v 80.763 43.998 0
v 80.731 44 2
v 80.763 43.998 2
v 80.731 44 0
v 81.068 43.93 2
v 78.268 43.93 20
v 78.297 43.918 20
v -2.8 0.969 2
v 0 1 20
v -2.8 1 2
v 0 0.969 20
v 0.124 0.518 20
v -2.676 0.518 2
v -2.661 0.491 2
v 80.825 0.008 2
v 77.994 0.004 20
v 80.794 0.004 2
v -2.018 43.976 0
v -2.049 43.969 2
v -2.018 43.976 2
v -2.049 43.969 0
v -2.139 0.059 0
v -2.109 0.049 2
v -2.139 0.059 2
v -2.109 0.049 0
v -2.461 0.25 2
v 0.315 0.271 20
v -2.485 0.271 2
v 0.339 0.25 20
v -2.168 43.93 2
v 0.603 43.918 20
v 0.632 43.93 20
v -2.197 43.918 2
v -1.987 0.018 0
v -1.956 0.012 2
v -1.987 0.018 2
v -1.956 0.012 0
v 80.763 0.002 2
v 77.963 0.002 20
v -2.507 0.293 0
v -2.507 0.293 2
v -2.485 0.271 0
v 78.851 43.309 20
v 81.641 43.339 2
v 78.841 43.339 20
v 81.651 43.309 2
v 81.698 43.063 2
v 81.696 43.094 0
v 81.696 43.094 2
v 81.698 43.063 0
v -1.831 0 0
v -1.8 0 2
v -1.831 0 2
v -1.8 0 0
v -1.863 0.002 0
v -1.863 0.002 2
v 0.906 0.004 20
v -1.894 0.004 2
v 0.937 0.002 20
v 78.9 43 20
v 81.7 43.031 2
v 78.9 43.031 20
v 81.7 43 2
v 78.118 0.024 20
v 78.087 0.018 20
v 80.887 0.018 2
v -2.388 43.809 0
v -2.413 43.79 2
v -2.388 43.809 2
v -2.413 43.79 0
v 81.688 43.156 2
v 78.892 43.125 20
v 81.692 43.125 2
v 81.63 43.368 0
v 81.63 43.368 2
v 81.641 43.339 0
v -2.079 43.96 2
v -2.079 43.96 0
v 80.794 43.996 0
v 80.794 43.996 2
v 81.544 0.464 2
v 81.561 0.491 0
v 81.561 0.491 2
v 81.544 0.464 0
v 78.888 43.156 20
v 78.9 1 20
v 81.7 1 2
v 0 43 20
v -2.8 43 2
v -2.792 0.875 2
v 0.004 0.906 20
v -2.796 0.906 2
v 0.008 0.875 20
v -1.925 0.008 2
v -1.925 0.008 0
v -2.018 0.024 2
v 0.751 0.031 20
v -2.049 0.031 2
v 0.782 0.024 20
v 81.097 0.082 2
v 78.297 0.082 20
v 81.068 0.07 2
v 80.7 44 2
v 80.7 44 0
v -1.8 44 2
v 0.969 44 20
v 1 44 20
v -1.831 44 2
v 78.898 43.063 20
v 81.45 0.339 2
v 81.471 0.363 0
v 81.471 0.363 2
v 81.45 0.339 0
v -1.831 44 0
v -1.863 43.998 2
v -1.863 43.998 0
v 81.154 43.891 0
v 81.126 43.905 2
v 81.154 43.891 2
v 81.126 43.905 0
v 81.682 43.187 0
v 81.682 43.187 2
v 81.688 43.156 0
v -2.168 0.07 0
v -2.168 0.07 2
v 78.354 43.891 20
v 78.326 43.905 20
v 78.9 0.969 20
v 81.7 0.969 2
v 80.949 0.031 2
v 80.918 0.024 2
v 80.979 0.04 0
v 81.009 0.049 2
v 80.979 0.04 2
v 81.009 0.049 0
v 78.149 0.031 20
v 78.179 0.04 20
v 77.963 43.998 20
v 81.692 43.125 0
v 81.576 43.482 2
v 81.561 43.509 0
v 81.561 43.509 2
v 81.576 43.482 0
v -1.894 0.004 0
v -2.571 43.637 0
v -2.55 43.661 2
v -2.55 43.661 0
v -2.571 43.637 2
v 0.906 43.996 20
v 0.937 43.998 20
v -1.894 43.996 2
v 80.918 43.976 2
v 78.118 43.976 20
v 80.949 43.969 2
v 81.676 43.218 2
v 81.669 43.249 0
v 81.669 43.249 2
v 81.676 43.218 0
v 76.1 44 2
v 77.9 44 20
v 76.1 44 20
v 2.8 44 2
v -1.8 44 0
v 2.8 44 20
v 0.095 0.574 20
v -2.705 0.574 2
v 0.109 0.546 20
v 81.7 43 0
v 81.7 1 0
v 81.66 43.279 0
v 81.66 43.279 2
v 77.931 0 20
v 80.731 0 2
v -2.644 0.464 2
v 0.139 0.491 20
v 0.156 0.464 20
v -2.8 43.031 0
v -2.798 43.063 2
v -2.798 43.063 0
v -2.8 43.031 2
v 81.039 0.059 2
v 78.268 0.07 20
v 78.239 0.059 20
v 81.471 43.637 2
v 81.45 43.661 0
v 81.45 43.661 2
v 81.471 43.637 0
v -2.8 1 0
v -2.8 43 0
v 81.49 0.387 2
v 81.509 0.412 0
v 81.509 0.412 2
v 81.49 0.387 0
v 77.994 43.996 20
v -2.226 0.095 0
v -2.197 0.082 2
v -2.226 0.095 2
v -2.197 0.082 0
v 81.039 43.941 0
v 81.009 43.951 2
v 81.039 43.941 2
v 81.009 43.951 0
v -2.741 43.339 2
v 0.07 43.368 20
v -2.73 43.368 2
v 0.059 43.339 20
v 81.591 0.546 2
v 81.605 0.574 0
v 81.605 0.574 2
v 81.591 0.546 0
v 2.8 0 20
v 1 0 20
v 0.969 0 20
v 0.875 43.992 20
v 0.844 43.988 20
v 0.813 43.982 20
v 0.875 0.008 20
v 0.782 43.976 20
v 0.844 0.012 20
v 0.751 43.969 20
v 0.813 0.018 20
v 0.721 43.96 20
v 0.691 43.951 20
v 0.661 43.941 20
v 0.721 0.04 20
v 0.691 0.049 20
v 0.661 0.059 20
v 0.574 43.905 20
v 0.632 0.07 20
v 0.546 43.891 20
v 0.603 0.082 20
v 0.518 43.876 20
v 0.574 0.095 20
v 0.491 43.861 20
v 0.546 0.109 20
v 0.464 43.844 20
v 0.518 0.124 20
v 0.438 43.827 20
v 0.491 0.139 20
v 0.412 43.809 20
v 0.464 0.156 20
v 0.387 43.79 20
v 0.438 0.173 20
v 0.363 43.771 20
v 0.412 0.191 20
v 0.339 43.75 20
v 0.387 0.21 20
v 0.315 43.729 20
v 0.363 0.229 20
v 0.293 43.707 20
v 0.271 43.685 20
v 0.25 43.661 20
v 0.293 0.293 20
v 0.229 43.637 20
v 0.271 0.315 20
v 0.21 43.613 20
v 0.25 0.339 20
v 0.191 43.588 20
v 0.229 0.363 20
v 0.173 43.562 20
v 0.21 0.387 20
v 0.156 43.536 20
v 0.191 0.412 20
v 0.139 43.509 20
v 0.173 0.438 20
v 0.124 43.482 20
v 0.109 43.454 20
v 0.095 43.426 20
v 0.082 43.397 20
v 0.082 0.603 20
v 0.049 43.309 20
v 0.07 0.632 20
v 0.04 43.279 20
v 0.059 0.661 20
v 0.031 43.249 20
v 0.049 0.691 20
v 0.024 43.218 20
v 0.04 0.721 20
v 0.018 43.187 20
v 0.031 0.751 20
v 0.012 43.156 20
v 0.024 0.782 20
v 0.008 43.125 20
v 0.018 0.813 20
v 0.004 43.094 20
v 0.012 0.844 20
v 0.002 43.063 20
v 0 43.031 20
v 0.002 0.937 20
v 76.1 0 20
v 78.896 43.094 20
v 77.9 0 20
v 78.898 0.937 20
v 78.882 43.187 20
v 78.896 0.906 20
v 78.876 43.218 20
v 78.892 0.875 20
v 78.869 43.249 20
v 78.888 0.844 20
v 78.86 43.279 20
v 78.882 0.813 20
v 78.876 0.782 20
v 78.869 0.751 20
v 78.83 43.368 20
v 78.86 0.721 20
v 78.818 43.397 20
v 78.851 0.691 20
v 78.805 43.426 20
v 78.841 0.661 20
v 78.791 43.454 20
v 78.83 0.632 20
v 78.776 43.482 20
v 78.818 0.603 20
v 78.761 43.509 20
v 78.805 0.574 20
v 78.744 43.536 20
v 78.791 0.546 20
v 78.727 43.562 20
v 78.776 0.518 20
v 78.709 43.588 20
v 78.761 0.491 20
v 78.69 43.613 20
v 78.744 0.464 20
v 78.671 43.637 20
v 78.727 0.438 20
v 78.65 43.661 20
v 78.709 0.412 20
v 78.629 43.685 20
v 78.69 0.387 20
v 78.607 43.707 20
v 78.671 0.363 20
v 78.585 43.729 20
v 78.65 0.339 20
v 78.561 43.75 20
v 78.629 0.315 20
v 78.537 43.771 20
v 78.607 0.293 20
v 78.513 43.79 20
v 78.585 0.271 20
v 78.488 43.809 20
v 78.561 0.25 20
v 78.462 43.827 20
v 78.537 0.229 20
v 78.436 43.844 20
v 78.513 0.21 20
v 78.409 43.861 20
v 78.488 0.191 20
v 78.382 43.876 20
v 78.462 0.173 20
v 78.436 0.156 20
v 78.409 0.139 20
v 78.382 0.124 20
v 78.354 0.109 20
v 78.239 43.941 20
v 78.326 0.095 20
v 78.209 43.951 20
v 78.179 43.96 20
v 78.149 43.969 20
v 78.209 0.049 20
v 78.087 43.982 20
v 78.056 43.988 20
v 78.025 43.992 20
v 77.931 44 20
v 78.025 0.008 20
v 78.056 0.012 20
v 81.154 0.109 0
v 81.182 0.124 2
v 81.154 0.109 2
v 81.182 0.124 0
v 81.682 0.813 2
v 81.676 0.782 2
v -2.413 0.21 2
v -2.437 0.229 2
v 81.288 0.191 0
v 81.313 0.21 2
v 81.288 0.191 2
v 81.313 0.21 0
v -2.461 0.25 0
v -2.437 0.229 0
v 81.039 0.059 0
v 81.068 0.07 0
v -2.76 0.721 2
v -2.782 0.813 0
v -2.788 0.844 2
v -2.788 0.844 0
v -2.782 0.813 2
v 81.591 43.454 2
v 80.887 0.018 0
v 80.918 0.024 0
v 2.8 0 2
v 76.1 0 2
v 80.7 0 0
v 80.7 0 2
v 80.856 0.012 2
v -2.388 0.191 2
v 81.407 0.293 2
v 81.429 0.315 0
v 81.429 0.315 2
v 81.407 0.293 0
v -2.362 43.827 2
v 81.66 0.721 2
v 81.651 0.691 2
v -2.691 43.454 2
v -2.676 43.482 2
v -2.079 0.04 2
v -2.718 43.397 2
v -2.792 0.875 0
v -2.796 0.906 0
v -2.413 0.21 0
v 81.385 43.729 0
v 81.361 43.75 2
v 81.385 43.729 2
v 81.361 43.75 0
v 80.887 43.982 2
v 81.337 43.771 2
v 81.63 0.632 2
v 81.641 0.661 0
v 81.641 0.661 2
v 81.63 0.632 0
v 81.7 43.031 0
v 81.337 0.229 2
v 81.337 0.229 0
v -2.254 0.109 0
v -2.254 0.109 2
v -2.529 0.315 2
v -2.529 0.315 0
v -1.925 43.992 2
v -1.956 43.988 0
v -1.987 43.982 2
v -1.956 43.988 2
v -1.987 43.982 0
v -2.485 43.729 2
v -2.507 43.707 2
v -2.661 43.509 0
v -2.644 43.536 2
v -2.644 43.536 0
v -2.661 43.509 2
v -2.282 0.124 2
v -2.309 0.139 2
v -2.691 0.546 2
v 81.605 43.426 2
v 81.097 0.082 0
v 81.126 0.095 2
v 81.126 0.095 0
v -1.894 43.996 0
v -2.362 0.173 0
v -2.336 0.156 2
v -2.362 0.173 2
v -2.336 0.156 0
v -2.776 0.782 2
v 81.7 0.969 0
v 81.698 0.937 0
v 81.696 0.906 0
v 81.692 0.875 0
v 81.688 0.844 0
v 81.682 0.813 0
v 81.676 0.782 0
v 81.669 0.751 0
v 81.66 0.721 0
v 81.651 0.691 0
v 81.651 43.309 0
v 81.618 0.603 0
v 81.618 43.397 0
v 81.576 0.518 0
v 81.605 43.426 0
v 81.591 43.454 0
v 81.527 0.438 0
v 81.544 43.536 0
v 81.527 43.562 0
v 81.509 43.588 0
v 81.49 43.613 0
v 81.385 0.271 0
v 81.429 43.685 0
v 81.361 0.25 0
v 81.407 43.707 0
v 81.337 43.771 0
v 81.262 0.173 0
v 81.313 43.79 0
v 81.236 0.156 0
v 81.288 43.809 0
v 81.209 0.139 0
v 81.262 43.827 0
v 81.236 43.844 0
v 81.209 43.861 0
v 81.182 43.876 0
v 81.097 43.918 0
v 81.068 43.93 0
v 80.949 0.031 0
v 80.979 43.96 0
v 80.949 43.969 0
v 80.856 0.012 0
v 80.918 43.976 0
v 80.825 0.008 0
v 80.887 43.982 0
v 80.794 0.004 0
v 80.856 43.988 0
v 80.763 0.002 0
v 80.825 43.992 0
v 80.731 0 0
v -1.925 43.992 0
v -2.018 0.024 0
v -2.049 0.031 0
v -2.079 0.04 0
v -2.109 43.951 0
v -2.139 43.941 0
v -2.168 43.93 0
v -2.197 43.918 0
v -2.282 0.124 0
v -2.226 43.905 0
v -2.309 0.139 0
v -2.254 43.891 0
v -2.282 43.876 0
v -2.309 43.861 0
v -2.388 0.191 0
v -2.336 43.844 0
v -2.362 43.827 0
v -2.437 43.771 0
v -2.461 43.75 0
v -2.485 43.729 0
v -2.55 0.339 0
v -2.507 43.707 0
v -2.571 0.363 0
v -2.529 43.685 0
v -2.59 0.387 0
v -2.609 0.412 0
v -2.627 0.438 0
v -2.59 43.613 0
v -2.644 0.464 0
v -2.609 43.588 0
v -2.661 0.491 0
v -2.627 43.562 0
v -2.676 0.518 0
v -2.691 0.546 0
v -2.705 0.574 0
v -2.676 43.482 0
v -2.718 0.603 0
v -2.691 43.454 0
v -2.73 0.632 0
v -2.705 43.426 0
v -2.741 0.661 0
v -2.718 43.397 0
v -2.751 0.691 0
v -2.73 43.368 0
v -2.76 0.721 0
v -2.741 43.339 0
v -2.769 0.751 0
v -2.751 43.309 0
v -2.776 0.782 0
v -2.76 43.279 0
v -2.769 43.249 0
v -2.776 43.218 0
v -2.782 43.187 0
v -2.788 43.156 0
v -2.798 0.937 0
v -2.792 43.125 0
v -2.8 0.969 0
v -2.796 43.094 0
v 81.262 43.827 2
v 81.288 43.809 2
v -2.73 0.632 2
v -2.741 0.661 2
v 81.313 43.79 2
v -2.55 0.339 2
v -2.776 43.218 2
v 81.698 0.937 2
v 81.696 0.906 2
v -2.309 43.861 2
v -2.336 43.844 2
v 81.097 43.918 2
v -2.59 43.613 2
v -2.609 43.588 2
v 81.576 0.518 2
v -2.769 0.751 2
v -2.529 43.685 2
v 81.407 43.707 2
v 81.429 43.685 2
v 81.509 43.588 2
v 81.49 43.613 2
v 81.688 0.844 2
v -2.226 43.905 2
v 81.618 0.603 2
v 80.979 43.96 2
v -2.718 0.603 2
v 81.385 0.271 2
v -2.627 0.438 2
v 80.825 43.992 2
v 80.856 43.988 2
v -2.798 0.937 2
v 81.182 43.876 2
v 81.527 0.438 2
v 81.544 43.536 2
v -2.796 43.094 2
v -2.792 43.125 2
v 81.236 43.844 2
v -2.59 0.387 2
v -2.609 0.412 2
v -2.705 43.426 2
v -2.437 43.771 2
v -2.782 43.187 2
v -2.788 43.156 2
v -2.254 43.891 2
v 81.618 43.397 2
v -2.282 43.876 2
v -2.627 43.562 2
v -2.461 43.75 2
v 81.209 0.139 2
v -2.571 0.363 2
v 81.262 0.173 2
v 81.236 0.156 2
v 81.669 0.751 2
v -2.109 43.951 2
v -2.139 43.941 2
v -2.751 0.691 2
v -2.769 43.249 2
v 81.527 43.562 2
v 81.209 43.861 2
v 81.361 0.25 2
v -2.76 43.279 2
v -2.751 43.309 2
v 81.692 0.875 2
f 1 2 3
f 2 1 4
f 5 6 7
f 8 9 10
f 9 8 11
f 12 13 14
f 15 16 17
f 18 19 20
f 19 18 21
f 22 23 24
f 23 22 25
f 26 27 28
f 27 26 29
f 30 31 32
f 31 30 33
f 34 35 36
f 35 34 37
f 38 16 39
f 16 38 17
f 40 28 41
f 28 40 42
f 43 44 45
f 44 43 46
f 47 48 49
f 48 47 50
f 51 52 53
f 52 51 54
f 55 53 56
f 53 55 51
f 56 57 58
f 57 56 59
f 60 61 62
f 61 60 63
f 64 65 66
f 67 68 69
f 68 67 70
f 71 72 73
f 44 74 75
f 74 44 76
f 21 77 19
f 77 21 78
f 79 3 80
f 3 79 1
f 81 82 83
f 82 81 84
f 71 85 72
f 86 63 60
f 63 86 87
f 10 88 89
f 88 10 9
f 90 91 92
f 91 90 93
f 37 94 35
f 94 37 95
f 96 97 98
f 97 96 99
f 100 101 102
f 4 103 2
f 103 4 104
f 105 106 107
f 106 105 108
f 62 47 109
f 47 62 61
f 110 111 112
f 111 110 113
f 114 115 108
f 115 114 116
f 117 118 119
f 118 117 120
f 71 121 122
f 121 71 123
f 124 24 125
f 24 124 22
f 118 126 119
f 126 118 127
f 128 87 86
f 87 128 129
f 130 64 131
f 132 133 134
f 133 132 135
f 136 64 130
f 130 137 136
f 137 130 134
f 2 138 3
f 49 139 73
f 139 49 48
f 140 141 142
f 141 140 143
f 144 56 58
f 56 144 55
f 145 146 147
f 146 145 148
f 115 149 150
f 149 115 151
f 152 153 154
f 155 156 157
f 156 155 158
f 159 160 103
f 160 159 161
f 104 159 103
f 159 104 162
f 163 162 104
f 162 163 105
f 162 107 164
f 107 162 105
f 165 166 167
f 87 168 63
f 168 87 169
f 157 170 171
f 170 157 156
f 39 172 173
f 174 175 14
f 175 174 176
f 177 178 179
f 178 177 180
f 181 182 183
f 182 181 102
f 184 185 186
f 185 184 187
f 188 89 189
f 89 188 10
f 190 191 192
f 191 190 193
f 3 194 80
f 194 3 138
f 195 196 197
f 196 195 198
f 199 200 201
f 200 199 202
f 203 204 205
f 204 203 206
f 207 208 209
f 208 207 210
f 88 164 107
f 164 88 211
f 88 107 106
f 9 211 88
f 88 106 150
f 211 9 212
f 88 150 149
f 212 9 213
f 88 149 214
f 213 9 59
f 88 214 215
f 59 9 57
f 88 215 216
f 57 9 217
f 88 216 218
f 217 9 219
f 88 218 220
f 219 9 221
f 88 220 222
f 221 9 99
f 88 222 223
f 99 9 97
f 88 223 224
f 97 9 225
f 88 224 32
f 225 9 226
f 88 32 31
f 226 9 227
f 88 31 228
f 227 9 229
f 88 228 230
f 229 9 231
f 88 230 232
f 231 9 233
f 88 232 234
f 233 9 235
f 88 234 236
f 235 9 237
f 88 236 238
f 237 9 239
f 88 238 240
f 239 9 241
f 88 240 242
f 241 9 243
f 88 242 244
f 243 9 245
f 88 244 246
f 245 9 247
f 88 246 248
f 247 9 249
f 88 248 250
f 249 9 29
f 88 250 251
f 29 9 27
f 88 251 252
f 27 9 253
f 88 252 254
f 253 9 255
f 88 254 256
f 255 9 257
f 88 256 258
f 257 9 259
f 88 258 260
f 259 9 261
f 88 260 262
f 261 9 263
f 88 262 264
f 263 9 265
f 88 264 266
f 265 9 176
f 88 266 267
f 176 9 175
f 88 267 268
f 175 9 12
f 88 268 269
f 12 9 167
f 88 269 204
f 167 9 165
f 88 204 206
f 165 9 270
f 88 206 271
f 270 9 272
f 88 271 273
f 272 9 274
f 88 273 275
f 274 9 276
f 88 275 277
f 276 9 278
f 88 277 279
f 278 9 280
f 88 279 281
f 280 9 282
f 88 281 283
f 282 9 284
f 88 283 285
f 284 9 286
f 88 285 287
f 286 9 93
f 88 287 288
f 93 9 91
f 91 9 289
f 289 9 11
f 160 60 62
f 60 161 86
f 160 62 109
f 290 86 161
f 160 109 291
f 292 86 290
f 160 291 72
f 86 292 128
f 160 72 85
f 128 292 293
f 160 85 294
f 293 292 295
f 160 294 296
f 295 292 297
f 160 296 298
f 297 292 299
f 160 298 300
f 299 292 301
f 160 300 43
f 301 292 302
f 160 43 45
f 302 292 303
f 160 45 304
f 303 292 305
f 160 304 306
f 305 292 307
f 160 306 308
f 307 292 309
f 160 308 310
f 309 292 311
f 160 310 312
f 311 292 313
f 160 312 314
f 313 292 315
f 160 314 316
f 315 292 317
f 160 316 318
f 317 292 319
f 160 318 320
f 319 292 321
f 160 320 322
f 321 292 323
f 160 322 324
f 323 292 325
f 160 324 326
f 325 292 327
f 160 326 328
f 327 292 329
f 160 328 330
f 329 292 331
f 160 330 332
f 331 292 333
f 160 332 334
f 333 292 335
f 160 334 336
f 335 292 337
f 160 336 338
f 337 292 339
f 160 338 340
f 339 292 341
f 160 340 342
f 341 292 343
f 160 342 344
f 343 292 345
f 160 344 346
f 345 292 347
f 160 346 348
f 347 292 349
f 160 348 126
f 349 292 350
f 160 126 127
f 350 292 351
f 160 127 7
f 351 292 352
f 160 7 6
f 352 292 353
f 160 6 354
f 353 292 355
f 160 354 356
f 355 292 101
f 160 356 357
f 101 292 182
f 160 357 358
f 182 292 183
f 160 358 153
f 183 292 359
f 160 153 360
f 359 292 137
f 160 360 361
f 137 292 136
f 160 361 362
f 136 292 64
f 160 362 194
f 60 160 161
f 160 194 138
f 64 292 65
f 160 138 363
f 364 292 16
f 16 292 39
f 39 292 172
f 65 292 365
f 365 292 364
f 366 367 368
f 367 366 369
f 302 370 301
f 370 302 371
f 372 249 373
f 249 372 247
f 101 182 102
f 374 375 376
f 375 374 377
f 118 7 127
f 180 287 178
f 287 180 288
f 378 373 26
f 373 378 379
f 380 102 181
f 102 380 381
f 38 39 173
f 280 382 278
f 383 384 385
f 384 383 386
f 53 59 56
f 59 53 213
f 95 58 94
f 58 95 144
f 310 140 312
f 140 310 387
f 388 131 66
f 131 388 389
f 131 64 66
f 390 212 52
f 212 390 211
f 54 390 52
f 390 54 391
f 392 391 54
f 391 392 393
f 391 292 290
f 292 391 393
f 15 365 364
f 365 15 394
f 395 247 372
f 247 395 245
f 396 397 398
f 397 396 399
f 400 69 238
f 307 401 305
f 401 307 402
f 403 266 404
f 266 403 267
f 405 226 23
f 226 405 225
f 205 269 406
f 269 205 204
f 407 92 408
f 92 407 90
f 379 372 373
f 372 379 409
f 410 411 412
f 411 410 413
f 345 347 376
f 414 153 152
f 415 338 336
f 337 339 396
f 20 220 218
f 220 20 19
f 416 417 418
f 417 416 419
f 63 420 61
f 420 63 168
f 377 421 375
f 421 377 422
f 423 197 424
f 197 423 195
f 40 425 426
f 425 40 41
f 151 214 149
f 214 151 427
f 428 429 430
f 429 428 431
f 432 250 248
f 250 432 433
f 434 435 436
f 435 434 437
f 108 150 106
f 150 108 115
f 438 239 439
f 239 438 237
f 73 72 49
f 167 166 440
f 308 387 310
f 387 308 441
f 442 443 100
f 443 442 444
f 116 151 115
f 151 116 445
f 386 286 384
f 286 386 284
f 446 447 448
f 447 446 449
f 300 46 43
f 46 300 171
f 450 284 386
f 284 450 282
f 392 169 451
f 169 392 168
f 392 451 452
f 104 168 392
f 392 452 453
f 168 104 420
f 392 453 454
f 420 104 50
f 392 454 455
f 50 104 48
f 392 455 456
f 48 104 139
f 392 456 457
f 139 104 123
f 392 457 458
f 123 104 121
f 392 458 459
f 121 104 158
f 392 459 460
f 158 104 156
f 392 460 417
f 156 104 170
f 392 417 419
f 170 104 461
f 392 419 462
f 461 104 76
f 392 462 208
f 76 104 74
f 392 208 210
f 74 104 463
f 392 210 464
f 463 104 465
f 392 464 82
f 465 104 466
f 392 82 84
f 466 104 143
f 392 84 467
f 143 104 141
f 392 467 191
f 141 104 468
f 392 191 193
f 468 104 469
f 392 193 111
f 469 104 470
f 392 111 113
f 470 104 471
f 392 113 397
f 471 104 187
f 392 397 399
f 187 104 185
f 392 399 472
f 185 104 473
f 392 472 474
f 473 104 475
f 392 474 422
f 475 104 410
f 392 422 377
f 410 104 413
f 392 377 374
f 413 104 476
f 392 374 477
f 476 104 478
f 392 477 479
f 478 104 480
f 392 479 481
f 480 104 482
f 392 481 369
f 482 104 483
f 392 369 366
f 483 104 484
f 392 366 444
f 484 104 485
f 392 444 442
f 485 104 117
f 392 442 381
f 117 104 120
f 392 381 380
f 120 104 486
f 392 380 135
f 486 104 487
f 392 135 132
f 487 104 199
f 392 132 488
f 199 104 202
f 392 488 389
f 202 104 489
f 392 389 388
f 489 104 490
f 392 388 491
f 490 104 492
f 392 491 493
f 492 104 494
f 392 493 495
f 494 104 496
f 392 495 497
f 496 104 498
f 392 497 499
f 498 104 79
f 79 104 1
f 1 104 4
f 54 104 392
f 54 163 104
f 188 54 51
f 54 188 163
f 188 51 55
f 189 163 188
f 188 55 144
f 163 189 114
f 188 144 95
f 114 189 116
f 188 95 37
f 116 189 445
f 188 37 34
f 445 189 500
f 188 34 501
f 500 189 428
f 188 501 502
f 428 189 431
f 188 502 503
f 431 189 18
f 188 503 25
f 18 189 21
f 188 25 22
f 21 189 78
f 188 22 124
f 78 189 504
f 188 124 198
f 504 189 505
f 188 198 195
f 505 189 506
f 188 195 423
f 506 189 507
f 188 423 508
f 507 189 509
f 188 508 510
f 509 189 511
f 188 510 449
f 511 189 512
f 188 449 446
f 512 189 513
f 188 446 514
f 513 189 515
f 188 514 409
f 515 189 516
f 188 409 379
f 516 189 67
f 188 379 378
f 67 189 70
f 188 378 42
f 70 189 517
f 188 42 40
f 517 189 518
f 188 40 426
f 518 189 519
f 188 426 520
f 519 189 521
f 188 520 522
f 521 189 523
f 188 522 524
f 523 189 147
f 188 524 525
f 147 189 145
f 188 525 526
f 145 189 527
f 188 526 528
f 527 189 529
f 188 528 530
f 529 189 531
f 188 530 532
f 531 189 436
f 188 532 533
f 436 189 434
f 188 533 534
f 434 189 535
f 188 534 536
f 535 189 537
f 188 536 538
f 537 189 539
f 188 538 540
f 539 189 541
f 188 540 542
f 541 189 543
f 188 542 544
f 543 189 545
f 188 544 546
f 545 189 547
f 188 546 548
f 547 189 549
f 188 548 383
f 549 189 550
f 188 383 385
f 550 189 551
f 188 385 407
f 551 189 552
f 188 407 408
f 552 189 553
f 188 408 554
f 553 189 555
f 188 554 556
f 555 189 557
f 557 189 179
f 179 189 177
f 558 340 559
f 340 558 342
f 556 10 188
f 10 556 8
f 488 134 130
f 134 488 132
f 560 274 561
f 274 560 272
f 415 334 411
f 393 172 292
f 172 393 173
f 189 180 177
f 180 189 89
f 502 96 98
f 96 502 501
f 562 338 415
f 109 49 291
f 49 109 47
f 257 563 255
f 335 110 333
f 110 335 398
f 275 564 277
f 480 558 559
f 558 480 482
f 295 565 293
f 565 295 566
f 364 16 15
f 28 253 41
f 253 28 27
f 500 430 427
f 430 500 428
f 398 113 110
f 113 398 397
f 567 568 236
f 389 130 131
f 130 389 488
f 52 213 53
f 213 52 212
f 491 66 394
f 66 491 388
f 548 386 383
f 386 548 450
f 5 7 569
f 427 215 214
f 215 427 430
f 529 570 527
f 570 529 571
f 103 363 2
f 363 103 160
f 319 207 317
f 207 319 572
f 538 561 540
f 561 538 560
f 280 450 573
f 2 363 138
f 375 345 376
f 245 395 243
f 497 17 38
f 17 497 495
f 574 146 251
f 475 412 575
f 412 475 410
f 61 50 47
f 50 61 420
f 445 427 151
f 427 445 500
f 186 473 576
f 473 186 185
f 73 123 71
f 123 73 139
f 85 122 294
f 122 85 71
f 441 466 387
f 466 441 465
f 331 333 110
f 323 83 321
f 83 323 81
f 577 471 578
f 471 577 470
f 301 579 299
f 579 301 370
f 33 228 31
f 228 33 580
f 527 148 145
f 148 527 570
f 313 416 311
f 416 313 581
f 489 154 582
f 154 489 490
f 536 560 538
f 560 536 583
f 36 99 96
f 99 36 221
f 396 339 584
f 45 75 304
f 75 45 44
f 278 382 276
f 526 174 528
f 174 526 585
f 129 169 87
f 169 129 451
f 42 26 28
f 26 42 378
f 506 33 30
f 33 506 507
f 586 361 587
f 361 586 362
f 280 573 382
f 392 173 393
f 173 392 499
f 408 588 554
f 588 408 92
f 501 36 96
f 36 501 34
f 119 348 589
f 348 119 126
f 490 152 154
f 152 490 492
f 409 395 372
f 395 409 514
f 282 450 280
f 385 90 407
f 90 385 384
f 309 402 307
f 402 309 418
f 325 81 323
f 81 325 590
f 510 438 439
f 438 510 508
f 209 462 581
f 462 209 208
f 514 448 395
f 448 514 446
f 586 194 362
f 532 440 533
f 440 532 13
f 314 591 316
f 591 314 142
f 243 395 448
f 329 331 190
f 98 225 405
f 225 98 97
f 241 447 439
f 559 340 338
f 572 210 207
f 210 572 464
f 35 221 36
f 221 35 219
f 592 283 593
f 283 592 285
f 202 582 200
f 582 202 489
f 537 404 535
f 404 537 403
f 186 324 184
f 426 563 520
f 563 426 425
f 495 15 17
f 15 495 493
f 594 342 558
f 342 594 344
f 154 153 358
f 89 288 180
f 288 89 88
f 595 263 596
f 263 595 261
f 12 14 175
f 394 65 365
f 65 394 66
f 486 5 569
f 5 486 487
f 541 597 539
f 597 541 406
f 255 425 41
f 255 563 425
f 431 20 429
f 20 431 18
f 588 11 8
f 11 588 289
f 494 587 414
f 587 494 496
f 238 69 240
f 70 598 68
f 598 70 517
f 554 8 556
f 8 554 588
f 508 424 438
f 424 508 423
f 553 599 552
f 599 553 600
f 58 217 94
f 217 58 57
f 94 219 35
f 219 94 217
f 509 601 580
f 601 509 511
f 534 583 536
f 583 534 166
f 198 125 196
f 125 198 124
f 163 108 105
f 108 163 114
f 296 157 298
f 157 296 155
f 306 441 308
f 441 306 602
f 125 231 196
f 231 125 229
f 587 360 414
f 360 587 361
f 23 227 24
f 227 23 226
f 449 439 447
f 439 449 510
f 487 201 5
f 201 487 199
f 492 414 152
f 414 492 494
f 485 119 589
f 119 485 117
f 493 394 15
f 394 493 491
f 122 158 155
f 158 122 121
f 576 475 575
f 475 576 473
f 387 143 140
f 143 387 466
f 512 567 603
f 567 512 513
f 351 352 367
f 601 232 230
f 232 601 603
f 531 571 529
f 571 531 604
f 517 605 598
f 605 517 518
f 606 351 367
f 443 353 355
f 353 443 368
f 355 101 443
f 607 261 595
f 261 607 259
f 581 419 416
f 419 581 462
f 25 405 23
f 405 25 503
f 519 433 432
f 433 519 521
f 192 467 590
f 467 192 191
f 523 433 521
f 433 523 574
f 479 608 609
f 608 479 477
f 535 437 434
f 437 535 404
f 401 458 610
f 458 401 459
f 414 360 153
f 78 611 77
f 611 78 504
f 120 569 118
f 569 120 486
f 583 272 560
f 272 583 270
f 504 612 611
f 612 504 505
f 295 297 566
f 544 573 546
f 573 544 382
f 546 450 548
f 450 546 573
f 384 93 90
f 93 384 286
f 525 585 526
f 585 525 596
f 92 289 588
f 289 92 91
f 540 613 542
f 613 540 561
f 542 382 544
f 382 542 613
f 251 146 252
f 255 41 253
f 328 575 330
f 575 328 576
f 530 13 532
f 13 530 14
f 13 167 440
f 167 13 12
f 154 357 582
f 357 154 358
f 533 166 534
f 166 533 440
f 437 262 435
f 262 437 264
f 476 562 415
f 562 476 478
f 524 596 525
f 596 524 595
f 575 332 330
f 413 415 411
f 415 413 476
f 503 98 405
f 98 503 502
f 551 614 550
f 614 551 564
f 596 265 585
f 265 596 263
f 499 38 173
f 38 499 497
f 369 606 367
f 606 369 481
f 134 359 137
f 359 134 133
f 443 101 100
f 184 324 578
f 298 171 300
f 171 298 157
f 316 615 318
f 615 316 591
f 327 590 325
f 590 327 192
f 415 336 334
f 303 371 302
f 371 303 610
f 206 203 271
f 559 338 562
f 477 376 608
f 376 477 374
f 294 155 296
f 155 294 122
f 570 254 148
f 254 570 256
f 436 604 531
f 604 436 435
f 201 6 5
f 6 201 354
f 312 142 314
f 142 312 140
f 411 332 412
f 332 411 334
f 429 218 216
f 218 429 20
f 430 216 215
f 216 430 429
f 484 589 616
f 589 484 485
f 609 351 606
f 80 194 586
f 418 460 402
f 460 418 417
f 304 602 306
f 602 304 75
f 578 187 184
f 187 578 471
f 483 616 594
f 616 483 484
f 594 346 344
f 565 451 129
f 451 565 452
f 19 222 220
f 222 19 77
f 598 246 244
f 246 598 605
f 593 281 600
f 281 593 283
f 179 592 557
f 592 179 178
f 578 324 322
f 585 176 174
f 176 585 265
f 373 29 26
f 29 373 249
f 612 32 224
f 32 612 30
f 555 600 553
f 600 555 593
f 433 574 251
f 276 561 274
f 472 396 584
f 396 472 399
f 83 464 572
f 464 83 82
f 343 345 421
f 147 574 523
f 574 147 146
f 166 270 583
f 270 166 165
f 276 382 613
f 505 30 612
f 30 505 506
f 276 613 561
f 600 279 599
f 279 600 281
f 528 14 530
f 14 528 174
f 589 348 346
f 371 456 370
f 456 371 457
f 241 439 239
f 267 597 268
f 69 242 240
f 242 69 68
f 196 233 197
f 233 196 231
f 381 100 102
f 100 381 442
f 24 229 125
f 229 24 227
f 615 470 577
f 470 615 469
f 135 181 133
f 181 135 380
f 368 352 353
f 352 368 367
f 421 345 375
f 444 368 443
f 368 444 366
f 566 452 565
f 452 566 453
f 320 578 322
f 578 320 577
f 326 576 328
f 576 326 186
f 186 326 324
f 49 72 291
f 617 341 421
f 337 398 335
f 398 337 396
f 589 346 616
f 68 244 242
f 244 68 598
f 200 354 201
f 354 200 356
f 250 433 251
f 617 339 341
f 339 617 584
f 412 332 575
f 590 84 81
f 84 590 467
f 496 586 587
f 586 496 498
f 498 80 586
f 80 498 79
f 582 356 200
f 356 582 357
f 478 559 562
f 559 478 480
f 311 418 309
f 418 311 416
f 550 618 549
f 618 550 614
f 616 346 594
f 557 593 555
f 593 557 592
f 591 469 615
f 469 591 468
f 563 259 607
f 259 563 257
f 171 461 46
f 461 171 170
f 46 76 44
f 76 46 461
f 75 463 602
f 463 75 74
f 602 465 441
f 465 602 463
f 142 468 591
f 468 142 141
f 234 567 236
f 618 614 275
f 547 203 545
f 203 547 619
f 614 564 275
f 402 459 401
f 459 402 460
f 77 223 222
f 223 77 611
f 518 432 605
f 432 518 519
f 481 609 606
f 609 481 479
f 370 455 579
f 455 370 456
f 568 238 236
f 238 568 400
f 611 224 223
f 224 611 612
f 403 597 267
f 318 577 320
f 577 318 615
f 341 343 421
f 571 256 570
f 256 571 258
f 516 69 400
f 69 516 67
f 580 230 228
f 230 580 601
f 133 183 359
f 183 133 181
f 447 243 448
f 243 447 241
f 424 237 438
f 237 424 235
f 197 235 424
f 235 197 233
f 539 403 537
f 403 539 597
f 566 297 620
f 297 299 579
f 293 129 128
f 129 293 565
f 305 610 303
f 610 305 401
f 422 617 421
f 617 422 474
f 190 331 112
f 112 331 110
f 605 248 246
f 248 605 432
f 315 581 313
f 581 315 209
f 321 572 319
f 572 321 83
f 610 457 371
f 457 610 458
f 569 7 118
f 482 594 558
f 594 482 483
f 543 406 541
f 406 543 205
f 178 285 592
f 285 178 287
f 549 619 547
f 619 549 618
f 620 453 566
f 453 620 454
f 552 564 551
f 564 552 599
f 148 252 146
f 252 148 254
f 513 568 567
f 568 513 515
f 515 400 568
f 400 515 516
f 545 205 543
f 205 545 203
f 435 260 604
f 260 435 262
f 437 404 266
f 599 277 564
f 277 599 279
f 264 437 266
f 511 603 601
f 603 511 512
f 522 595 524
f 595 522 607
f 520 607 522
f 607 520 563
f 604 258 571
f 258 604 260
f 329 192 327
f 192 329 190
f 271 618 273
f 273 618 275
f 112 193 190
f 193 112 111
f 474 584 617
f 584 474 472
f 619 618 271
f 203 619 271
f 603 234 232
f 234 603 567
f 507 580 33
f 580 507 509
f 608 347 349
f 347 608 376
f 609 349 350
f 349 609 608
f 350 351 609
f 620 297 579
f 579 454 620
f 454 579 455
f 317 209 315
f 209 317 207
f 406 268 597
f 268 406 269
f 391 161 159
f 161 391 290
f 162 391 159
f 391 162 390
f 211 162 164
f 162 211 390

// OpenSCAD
$fn=200;

w=2.8;
x=73.3;
y=44;

difference() {
    hull() {
        cube_rounded(v=[x+2*w,y,20], r=1);
        translate(v = [-w,0,0]) cube_rounded(v=[x+4*w,y,2], r=1);
    }
    translate(v = [w,0,2]) cube([x,y,20]);
}

module cube_rounded(v, r=3, center=false){
    translate(center==true ? [r-v[0]/2,r-v[1]/2,v[2]/2] : [r,r,0])
    hull(){
        cylinder(h = v[2], r = r);
        translate(v = [0,v[1]-2*r,0]) cylinder(h = v[2], r = r);
        translate(v = [v[0]-2*r,v[1]-2*r,0]) cylinder(h = v[2], r = r);
        translate(v = [v[0]-2*r,0,0]) cylinder(h = v[2], r = r);
    }
}
